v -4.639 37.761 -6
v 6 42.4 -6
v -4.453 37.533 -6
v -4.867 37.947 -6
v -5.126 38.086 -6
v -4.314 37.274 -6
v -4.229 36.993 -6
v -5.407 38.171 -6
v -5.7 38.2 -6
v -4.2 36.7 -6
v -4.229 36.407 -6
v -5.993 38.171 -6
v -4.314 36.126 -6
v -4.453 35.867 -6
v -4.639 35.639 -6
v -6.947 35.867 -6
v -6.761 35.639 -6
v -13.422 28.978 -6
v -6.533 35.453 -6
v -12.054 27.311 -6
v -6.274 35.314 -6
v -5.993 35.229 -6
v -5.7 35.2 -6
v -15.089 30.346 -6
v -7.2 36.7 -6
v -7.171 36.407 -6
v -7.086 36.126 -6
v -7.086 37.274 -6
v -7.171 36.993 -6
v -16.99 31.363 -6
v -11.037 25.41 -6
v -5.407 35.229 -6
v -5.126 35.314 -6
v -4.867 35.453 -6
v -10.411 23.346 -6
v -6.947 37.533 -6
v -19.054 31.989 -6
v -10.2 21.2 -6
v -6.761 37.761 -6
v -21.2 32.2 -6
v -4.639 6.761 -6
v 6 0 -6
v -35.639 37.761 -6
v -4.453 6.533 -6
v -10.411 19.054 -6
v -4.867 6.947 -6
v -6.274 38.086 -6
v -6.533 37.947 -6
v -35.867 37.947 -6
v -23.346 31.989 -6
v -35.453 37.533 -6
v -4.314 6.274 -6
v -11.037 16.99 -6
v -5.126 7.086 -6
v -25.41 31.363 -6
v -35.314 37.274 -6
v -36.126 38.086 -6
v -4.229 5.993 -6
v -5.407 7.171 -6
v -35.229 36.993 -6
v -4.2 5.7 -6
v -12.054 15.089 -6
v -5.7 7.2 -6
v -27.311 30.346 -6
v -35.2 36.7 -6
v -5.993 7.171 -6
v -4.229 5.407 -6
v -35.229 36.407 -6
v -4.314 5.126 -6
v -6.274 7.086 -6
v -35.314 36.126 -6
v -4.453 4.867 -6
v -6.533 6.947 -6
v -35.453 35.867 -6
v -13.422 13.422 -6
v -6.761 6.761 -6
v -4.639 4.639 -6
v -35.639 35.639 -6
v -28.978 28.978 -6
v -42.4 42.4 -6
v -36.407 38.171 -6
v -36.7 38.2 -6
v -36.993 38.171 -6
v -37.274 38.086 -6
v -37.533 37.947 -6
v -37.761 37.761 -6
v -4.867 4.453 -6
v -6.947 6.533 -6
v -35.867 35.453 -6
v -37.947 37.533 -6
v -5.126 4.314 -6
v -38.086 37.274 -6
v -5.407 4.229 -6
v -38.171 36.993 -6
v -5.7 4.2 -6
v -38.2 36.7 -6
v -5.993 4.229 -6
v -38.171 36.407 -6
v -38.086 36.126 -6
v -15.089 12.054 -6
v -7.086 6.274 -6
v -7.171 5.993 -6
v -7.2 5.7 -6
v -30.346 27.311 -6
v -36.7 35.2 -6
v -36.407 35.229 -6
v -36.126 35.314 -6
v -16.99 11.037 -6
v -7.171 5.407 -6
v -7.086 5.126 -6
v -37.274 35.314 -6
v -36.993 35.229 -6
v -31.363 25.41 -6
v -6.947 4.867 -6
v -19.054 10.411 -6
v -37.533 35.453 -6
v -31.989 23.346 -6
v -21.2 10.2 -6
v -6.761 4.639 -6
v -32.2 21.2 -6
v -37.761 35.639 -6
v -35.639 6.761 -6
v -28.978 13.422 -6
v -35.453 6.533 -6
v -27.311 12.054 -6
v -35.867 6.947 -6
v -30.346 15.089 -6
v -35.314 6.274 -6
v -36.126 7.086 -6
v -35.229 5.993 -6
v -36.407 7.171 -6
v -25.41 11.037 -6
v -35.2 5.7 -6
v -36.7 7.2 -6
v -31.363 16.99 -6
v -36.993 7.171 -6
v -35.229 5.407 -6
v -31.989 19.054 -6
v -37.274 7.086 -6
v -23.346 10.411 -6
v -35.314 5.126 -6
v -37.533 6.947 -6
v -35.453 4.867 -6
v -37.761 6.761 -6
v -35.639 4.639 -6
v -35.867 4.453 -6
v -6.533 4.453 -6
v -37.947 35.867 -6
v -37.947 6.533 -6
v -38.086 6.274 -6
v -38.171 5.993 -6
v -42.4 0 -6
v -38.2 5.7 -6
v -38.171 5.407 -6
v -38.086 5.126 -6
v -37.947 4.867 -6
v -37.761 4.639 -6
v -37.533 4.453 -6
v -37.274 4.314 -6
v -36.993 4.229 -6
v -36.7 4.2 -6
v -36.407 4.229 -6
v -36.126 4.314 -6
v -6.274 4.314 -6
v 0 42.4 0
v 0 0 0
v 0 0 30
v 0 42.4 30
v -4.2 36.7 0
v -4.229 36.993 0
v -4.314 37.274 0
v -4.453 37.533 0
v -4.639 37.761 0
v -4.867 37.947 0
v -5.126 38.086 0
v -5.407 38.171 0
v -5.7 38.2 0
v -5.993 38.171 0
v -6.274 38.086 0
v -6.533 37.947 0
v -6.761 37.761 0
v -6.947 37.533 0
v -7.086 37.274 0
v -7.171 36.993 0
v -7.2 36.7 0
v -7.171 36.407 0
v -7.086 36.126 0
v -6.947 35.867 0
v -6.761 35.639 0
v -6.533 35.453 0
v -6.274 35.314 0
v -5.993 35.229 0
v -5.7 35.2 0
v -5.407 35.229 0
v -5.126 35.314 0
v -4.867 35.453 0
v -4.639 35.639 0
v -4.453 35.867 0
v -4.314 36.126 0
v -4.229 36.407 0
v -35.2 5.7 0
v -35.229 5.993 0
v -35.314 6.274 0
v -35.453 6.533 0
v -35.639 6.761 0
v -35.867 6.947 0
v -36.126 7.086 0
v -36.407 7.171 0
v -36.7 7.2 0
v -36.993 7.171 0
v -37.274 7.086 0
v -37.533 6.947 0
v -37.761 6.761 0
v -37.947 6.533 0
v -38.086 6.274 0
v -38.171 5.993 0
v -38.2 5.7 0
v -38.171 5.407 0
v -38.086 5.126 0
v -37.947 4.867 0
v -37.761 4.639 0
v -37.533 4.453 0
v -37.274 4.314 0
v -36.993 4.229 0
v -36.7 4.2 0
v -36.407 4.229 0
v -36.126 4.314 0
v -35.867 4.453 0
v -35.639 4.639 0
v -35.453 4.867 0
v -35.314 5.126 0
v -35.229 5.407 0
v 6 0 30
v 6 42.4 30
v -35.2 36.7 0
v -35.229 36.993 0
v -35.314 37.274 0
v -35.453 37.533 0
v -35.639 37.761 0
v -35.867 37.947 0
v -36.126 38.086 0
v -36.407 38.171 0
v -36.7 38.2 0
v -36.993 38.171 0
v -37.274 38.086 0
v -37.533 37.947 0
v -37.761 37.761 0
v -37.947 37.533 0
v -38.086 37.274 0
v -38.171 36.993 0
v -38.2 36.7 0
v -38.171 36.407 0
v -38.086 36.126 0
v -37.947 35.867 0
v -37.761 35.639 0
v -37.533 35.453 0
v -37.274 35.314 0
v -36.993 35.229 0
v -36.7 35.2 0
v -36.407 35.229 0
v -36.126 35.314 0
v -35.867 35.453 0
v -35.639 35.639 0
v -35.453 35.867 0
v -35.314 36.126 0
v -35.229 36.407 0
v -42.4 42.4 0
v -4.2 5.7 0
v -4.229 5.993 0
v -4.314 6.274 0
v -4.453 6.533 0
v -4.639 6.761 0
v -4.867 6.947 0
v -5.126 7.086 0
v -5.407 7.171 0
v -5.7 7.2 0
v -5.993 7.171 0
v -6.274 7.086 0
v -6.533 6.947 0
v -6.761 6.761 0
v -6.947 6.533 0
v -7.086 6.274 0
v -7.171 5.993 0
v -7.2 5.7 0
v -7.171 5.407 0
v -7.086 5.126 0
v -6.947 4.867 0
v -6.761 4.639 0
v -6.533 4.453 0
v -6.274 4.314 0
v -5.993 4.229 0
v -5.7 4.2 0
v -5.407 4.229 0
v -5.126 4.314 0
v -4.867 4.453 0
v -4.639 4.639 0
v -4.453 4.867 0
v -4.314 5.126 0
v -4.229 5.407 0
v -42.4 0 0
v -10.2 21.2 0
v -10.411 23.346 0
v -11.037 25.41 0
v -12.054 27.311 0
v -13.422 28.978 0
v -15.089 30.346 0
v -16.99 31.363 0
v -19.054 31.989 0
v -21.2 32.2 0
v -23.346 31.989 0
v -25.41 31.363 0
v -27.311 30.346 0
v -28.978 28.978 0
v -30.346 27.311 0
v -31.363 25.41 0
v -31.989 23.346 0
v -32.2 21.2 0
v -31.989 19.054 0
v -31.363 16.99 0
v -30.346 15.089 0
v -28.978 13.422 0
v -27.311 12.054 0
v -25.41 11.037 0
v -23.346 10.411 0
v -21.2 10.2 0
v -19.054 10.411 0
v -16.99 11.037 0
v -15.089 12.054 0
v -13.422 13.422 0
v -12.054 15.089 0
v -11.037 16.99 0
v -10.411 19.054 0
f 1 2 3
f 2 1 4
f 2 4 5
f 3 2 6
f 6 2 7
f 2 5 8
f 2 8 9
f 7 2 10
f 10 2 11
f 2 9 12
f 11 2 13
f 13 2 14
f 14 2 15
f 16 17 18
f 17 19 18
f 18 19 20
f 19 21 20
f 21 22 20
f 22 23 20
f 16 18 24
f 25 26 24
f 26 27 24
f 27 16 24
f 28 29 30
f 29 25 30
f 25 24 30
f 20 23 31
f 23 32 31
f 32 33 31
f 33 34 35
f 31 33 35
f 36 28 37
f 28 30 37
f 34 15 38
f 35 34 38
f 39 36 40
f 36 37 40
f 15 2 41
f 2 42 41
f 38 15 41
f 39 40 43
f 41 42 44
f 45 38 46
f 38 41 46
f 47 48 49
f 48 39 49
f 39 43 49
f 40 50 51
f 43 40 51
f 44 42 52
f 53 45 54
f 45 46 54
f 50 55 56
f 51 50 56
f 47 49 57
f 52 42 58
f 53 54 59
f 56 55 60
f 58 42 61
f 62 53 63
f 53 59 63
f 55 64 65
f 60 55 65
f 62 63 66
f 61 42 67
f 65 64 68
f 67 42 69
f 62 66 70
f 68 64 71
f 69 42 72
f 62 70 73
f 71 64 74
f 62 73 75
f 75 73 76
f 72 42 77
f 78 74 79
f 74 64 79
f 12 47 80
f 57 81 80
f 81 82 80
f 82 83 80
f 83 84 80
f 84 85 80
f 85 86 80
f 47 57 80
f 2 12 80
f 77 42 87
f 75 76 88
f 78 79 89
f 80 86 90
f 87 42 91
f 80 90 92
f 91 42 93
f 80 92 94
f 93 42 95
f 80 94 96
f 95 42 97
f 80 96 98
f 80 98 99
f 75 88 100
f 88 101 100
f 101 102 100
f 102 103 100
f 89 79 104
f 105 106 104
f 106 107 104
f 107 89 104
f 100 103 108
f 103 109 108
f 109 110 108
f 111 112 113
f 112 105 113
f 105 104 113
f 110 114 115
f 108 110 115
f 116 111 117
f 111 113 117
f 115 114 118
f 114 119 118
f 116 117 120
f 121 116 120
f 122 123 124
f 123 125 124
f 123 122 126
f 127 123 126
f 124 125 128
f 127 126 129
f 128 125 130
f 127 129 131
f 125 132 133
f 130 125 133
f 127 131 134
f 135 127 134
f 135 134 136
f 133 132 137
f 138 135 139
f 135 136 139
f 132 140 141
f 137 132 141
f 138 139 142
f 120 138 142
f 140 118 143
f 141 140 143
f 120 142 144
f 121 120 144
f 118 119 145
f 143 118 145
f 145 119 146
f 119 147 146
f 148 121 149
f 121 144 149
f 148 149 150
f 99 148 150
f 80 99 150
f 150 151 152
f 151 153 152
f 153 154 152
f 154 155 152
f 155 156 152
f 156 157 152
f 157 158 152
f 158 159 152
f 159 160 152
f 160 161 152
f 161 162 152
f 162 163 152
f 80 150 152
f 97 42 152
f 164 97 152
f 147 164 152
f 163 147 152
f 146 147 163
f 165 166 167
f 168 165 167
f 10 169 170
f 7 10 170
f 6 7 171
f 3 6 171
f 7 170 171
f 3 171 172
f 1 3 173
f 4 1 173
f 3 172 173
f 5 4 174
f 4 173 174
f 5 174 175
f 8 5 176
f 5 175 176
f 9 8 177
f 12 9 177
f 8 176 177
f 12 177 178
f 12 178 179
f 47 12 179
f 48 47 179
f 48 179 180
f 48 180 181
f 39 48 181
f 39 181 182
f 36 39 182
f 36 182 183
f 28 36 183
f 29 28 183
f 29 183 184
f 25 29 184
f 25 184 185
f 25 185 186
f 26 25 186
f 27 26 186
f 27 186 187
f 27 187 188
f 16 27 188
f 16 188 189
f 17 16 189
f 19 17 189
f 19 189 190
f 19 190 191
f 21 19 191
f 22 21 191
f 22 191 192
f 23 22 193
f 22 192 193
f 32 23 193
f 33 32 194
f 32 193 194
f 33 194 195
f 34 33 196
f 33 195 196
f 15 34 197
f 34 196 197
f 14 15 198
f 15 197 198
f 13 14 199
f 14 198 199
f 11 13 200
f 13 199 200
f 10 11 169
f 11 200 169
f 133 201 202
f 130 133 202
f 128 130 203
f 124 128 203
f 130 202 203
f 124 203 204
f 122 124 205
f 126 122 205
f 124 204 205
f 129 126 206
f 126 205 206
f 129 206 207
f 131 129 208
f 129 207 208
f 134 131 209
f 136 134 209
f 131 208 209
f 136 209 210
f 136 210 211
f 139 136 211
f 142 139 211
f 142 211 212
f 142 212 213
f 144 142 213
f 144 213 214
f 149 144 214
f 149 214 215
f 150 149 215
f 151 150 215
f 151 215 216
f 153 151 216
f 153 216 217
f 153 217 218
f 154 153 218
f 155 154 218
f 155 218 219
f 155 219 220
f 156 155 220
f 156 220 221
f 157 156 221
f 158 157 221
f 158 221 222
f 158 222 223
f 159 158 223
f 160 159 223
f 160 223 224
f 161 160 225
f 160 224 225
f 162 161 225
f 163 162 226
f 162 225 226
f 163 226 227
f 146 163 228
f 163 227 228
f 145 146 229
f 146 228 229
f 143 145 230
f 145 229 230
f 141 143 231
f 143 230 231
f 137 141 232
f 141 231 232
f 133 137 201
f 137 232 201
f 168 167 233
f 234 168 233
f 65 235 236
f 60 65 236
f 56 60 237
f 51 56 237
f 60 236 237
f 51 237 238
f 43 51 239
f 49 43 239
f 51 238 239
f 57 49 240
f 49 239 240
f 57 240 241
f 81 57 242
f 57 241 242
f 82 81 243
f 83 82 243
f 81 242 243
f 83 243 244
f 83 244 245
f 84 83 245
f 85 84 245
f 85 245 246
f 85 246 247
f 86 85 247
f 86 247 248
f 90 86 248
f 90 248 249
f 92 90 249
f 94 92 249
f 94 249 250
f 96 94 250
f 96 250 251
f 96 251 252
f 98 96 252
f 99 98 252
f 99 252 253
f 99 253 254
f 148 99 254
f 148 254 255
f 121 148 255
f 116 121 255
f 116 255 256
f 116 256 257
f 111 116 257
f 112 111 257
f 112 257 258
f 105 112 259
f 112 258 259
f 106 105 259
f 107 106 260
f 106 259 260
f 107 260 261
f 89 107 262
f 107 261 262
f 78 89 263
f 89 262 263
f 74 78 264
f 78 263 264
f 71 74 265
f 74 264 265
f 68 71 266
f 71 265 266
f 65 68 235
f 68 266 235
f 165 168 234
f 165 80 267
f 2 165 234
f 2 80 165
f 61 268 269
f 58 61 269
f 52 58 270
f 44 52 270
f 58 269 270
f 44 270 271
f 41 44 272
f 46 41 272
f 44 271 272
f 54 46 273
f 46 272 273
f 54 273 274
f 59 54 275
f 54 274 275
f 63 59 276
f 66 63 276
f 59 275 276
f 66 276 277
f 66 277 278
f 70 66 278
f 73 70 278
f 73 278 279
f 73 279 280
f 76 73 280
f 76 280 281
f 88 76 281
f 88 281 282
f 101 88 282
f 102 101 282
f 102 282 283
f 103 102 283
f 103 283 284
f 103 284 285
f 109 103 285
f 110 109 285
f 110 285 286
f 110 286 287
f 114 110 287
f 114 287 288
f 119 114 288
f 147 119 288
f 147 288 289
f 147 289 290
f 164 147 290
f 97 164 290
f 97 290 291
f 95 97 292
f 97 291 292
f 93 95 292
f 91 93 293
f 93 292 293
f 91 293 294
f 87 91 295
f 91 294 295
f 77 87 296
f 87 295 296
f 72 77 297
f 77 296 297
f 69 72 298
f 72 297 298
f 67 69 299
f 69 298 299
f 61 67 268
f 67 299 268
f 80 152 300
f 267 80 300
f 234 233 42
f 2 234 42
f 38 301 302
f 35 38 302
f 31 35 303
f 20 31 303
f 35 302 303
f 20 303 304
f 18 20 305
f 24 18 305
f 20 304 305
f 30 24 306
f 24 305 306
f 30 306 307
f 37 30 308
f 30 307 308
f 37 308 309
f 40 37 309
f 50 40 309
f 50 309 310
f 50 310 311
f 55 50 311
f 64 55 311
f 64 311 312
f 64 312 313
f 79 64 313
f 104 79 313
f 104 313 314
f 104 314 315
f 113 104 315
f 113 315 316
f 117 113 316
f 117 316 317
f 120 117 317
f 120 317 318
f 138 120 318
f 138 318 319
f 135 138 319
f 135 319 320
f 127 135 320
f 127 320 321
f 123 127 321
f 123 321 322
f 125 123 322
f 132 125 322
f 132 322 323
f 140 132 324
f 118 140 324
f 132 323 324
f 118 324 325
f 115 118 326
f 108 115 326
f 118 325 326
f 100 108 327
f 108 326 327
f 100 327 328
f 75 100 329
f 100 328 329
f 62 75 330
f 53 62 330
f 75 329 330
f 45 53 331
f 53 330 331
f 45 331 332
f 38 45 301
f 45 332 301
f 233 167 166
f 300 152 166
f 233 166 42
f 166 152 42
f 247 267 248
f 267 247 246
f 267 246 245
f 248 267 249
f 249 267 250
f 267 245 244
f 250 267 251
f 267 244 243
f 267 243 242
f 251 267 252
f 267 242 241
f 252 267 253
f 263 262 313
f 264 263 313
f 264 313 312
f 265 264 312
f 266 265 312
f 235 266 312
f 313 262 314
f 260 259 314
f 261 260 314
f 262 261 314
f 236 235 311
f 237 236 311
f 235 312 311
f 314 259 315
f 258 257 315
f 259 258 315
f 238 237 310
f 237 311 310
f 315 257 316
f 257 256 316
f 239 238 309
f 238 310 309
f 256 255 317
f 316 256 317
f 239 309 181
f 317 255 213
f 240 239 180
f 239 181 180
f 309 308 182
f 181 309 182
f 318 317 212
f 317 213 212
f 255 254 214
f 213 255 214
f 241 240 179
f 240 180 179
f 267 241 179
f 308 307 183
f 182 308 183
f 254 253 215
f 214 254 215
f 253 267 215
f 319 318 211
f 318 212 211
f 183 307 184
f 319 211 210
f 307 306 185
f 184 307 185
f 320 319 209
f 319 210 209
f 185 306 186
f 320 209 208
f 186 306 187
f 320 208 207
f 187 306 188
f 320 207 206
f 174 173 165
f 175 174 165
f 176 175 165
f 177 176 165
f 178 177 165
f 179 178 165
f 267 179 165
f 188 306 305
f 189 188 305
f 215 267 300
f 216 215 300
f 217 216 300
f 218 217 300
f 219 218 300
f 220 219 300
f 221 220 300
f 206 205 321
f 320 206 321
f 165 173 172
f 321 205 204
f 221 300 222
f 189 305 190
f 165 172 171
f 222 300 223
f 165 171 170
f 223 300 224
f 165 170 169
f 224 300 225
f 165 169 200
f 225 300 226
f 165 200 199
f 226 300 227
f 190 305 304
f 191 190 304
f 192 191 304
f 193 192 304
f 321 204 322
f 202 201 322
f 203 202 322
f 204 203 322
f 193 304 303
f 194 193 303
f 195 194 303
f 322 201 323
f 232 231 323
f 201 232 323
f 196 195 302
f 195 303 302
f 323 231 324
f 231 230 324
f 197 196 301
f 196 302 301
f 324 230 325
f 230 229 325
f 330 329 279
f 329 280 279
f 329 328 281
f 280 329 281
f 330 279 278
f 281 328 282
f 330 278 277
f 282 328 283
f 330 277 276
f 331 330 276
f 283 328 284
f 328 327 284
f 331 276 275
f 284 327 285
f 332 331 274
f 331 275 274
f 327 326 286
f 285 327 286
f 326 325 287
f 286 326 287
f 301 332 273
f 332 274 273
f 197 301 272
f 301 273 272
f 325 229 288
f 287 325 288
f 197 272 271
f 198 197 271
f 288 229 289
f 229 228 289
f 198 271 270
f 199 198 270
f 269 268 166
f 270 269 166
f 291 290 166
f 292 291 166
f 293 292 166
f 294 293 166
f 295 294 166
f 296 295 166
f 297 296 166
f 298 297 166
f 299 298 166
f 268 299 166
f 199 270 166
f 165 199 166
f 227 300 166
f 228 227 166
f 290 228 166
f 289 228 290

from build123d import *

# Parameters (mm, degrees)
BOSS_EXTRUDE1_DEPTH = 42.4
SKETCH3_R           = 11
SKETCH3_R_2         = 1.5
CUT_EXTRUDE1_DEPTH  = 7


with BuildPart() as part:
    # Sketch2 → Boss-Extrude1 (new body)
    with BuildSketch(Plane(origin=(0, 0, 0), x_dir=(1, 0, 0), z_dir=(0, 1, 0))):
        Polygon((-42.4, 0), (0, 0), (0, -30), (6, -30), (6, 6), (-42.4, 6), align=None)
    extrude(amount=BOSS_EXTRUDE1_DEPTH)

    # Sketch3 → Cut-Extrude1 (cut, through all)
    with BuildSketch(Plane.XY):
        with Locations((-21.2, 21.2)):
            Circle(SKETCH3_R)
        with Locations((-36.7, 36.7)):
            Circle(SKETCH3_R_2)
        with Locations((-5.7, 36.7)):
            Circle(SKETCH3_R_2)
        with Locations((-5.7, 5.7)):
            Circle(SKETCH3_R_2)
        with Locations((-36.7, 5.7)):
            Circle(SKETCH3_R_2)
    extrude(amount=-CUT_EXTRUDE1_DEPTH, mode=Mode.SUBTRACT)


solid = part.part
